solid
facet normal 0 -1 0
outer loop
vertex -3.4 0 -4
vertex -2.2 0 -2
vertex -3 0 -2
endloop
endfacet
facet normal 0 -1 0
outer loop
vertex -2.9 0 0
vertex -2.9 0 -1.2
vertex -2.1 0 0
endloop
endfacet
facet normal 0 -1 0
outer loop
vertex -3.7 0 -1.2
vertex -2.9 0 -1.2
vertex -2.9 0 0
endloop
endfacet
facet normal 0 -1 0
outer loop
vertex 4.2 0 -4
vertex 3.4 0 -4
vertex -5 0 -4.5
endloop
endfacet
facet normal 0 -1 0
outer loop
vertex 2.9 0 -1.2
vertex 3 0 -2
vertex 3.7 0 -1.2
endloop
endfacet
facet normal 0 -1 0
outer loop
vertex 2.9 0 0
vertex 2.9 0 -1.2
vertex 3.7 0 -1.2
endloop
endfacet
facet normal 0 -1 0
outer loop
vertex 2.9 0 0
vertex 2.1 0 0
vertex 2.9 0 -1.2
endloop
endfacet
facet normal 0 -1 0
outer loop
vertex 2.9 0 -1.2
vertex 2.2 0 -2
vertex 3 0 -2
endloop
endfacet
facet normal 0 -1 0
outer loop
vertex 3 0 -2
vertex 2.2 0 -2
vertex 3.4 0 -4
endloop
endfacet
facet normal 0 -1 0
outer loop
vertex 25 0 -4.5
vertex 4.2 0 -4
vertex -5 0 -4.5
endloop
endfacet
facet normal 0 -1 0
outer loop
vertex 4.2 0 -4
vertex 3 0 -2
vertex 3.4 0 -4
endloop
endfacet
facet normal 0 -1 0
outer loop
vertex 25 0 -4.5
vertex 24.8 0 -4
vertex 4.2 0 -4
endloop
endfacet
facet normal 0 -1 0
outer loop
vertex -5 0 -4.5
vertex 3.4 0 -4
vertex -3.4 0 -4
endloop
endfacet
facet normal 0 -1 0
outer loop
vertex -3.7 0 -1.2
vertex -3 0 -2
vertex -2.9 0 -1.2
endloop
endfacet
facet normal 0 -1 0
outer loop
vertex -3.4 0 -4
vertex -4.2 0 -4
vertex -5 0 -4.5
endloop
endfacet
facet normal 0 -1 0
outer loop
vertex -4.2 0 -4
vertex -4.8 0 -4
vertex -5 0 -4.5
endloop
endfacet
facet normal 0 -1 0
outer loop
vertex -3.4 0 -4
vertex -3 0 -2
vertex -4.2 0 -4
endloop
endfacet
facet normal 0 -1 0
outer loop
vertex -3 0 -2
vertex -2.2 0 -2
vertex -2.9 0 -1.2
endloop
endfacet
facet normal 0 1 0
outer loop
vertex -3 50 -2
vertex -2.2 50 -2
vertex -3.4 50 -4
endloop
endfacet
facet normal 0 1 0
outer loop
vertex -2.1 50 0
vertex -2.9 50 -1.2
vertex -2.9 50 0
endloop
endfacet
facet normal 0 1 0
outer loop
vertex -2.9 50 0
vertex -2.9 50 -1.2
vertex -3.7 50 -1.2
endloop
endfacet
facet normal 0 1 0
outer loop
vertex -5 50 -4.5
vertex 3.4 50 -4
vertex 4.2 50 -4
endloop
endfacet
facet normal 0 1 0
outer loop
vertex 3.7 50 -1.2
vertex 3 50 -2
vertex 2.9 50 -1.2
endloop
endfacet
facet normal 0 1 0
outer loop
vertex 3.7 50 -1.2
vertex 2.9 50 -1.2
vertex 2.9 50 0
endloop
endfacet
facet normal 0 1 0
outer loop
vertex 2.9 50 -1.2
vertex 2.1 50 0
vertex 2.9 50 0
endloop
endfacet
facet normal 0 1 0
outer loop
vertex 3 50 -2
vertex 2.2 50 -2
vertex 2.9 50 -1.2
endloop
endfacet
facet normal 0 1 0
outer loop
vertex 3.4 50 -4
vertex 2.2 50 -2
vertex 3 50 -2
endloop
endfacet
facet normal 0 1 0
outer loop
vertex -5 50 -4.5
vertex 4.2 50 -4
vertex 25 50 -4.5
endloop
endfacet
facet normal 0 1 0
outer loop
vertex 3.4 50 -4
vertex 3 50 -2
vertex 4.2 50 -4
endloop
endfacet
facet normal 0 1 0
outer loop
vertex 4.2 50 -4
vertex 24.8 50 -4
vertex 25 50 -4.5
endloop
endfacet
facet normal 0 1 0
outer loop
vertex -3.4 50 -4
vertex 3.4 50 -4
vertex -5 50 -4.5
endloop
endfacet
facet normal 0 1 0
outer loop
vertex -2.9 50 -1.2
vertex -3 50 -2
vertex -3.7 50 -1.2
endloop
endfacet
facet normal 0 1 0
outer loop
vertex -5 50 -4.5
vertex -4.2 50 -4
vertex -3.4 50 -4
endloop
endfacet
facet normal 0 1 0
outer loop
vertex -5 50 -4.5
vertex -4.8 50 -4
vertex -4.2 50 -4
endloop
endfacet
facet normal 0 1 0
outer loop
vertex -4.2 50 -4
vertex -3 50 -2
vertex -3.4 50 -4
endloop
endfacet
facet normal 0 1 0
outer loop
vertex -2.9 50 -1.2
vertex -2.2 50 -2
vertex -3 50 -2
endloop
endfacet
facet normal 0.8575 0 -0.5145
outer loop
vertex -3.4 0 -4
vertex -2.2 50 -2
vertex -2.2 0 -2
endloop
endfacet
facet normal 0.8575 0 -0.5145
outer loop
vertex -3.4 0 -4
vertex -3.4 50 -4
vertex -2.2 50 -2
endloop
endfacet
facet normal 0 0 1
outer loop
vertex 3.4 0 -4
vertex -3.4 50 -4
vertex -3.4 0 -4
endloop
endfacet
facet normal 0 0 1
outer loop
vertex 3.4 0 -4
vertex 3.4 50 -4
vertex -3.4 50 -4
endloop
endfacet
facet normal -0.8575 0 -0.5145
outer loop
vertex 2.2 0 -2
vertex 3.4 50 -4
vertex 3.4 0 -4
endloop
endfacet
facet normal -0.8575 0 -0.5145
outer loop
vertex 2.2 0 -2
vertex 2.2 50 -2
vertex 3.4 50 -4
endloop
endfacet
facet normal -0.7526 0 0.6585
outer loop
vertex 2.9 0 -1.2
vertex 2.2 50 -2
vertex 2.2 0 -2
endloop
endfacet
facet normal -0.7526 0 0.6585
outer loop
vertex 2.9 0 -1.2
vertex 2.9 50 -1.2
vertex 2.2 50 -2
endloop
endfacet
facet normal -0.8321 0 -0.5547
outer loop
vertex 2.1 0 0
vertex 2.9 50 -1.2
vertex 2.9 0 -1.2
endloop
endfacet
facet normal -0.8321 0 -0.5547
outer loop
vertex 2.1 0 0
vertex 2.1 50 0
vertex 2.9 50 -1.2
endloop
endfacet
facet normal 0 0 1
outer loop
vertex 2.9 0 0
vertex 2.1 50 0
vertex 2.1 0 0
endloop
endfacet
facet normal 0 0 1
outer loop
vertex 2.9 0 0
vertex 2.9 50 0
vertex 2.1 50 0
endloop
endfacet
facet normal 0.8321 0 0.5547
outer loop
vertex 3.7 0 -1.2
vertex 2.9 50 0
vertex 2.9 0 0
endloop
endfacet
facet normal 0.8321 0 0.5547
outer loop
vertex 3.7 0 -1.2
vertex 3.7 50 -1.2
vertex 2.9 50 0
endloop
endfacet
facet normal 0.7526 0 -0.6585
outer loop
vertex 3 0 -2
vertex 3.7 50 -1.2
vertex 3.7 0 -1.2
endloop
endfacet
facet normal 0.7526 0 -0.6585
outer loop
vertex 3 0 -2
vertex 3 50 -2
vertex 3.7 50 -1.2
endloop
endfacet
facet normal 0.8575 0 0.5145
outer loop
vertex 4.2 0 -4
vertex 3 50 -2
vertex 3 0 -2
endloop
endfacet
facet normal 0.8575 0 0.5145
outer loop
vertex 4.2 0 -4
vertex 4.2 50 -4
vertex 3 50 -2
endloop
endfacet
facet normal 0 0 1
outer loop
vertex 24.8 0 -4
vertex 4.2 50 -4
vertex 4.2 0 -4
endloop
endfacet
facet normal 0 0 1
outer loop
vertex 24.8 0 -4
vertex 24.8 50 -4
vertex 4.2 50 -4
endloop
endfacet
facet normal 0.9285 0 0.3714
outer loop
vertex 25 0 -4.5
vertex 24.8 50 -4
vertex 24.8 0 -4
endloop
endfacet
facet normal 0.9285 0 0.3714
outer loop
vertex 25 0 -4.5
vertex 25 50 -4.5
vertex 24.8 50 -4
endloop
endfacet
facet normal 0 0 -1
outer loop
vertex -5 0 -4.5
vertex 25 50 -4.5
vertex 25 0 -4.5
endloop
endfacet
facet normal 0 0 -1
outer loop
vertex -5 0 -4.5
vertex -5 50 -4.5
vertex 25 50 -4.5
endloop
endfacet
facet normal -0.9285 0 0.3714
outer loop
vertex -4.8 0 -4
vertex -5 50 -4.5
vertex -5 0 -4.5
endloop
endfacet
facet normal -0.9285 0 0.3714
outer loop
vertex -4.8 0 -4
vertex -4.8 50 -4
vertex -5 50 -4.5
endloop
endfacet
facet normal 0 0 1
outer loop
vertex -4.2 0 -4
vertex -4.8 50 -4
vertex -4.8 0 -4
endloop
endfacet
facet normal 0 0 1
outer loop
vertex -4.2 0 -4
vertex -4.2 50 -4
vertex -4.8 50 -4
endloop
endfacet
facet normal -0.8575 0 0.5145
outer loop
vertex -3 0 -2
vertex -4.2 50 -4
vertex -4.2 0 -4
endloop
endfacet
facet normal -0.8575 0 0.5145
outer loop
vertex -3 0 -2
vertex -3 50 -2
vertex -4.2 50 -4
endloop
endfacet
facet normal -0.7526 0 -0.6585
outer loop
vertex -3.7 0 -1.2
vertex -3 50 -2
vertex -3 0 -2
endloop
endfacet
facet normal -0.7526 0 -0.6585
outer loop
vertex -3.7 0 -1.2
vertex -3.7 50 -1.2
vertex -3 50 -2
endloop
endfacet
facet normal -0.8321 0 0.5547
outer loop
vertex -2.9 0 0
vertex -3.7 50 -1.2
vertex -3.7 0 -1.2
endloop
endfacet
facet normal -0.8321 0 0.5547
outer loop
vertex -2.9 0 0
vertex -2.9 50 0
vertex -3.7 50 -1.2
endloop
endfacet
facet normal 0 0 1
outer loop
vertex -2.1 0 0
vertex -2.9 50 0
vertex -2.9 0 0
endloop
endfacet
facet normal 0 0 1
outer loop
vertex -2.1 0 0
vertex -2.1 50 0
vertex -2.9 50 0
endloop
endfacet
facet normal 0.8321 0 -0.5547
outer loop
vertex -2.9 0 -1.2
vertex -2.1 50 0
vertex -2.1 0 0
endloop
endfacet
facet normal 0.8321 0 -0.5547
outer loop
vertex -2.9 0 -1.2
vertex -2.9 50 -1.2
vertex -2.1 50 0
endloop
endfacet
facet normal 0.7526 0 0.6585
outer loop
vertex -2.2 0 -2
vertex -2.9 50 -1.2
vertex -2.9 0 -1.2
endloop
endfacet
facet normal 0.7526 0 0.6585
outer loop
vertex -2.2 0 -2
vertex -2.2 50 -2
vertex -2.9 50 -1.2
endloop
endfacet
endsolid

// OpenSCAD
module vslotCover(length, side_extension_width=0) {
	/* HIDDEN */
	side_add_w = side_extension_width;

	$fn = 1 * 60;

	top2_w = 1 * 9.6;
	top_w = 1 * 10; // 9.2 -v2> 9.6 -v3> 10
	w1 = 1 * 8.4;
	w2 = 1 * 6;
	w3 = 1 * 7.4; // 8 -v2> 7.4
	bottom_w = 1 * 5.8;

	h1 = 1 * 4; // 3.8 -v4> 4.0
	h2 = 1 * 2;
	h3 = 1 * 1.2;
	h_top_cover = 1 * 0.5;

	wall_thick = 1 * 0.8; //
	tb_thick = 1 * 0; // top-bottom thickness 0.8 -v3> 0.4 -v4> 0

	// MAIN

	rotate([- 90, 0, 0])
		linear_extrude(height = length) {
			difference() {
				polygon(points = [[- bottom_w / 2, 0],
						[- w3 / 2, h3],
						[- w2 / 2, h2],
						[- w1 / 2, h1],
						[- top2_w / 2, h1],
						[- top_w / 2, h1 + h_top_cover],
						[top_w / 2 + side_add_w, h1 + h_top_cover],
						[top2_w / 2 + side_add_w, h1],
						[w1 / 2, h1],
						[w2 / 2, h2],
						[w3 / 2, h3],
						[bottom_w / 2, 0]]);

				polygon(points = [[- bottom_w / 2 + wall_thick, tb_thick],
						[- w3 / 2 + wall_thick, h3],
						[- w2 / 2 + wall_thick, h2],
						[- w1 / 2 + wall_thick, h1],
						[w1 / 2 - wall_thick, h1],
						[w2 / 2 - wall_thick, h2],
						[w3 / 2 - wall_thick, h3],
						[bottom_w / 2 - wall_thick, tb_thick]]);
			}

		}
}

vslotCover(50,20);
